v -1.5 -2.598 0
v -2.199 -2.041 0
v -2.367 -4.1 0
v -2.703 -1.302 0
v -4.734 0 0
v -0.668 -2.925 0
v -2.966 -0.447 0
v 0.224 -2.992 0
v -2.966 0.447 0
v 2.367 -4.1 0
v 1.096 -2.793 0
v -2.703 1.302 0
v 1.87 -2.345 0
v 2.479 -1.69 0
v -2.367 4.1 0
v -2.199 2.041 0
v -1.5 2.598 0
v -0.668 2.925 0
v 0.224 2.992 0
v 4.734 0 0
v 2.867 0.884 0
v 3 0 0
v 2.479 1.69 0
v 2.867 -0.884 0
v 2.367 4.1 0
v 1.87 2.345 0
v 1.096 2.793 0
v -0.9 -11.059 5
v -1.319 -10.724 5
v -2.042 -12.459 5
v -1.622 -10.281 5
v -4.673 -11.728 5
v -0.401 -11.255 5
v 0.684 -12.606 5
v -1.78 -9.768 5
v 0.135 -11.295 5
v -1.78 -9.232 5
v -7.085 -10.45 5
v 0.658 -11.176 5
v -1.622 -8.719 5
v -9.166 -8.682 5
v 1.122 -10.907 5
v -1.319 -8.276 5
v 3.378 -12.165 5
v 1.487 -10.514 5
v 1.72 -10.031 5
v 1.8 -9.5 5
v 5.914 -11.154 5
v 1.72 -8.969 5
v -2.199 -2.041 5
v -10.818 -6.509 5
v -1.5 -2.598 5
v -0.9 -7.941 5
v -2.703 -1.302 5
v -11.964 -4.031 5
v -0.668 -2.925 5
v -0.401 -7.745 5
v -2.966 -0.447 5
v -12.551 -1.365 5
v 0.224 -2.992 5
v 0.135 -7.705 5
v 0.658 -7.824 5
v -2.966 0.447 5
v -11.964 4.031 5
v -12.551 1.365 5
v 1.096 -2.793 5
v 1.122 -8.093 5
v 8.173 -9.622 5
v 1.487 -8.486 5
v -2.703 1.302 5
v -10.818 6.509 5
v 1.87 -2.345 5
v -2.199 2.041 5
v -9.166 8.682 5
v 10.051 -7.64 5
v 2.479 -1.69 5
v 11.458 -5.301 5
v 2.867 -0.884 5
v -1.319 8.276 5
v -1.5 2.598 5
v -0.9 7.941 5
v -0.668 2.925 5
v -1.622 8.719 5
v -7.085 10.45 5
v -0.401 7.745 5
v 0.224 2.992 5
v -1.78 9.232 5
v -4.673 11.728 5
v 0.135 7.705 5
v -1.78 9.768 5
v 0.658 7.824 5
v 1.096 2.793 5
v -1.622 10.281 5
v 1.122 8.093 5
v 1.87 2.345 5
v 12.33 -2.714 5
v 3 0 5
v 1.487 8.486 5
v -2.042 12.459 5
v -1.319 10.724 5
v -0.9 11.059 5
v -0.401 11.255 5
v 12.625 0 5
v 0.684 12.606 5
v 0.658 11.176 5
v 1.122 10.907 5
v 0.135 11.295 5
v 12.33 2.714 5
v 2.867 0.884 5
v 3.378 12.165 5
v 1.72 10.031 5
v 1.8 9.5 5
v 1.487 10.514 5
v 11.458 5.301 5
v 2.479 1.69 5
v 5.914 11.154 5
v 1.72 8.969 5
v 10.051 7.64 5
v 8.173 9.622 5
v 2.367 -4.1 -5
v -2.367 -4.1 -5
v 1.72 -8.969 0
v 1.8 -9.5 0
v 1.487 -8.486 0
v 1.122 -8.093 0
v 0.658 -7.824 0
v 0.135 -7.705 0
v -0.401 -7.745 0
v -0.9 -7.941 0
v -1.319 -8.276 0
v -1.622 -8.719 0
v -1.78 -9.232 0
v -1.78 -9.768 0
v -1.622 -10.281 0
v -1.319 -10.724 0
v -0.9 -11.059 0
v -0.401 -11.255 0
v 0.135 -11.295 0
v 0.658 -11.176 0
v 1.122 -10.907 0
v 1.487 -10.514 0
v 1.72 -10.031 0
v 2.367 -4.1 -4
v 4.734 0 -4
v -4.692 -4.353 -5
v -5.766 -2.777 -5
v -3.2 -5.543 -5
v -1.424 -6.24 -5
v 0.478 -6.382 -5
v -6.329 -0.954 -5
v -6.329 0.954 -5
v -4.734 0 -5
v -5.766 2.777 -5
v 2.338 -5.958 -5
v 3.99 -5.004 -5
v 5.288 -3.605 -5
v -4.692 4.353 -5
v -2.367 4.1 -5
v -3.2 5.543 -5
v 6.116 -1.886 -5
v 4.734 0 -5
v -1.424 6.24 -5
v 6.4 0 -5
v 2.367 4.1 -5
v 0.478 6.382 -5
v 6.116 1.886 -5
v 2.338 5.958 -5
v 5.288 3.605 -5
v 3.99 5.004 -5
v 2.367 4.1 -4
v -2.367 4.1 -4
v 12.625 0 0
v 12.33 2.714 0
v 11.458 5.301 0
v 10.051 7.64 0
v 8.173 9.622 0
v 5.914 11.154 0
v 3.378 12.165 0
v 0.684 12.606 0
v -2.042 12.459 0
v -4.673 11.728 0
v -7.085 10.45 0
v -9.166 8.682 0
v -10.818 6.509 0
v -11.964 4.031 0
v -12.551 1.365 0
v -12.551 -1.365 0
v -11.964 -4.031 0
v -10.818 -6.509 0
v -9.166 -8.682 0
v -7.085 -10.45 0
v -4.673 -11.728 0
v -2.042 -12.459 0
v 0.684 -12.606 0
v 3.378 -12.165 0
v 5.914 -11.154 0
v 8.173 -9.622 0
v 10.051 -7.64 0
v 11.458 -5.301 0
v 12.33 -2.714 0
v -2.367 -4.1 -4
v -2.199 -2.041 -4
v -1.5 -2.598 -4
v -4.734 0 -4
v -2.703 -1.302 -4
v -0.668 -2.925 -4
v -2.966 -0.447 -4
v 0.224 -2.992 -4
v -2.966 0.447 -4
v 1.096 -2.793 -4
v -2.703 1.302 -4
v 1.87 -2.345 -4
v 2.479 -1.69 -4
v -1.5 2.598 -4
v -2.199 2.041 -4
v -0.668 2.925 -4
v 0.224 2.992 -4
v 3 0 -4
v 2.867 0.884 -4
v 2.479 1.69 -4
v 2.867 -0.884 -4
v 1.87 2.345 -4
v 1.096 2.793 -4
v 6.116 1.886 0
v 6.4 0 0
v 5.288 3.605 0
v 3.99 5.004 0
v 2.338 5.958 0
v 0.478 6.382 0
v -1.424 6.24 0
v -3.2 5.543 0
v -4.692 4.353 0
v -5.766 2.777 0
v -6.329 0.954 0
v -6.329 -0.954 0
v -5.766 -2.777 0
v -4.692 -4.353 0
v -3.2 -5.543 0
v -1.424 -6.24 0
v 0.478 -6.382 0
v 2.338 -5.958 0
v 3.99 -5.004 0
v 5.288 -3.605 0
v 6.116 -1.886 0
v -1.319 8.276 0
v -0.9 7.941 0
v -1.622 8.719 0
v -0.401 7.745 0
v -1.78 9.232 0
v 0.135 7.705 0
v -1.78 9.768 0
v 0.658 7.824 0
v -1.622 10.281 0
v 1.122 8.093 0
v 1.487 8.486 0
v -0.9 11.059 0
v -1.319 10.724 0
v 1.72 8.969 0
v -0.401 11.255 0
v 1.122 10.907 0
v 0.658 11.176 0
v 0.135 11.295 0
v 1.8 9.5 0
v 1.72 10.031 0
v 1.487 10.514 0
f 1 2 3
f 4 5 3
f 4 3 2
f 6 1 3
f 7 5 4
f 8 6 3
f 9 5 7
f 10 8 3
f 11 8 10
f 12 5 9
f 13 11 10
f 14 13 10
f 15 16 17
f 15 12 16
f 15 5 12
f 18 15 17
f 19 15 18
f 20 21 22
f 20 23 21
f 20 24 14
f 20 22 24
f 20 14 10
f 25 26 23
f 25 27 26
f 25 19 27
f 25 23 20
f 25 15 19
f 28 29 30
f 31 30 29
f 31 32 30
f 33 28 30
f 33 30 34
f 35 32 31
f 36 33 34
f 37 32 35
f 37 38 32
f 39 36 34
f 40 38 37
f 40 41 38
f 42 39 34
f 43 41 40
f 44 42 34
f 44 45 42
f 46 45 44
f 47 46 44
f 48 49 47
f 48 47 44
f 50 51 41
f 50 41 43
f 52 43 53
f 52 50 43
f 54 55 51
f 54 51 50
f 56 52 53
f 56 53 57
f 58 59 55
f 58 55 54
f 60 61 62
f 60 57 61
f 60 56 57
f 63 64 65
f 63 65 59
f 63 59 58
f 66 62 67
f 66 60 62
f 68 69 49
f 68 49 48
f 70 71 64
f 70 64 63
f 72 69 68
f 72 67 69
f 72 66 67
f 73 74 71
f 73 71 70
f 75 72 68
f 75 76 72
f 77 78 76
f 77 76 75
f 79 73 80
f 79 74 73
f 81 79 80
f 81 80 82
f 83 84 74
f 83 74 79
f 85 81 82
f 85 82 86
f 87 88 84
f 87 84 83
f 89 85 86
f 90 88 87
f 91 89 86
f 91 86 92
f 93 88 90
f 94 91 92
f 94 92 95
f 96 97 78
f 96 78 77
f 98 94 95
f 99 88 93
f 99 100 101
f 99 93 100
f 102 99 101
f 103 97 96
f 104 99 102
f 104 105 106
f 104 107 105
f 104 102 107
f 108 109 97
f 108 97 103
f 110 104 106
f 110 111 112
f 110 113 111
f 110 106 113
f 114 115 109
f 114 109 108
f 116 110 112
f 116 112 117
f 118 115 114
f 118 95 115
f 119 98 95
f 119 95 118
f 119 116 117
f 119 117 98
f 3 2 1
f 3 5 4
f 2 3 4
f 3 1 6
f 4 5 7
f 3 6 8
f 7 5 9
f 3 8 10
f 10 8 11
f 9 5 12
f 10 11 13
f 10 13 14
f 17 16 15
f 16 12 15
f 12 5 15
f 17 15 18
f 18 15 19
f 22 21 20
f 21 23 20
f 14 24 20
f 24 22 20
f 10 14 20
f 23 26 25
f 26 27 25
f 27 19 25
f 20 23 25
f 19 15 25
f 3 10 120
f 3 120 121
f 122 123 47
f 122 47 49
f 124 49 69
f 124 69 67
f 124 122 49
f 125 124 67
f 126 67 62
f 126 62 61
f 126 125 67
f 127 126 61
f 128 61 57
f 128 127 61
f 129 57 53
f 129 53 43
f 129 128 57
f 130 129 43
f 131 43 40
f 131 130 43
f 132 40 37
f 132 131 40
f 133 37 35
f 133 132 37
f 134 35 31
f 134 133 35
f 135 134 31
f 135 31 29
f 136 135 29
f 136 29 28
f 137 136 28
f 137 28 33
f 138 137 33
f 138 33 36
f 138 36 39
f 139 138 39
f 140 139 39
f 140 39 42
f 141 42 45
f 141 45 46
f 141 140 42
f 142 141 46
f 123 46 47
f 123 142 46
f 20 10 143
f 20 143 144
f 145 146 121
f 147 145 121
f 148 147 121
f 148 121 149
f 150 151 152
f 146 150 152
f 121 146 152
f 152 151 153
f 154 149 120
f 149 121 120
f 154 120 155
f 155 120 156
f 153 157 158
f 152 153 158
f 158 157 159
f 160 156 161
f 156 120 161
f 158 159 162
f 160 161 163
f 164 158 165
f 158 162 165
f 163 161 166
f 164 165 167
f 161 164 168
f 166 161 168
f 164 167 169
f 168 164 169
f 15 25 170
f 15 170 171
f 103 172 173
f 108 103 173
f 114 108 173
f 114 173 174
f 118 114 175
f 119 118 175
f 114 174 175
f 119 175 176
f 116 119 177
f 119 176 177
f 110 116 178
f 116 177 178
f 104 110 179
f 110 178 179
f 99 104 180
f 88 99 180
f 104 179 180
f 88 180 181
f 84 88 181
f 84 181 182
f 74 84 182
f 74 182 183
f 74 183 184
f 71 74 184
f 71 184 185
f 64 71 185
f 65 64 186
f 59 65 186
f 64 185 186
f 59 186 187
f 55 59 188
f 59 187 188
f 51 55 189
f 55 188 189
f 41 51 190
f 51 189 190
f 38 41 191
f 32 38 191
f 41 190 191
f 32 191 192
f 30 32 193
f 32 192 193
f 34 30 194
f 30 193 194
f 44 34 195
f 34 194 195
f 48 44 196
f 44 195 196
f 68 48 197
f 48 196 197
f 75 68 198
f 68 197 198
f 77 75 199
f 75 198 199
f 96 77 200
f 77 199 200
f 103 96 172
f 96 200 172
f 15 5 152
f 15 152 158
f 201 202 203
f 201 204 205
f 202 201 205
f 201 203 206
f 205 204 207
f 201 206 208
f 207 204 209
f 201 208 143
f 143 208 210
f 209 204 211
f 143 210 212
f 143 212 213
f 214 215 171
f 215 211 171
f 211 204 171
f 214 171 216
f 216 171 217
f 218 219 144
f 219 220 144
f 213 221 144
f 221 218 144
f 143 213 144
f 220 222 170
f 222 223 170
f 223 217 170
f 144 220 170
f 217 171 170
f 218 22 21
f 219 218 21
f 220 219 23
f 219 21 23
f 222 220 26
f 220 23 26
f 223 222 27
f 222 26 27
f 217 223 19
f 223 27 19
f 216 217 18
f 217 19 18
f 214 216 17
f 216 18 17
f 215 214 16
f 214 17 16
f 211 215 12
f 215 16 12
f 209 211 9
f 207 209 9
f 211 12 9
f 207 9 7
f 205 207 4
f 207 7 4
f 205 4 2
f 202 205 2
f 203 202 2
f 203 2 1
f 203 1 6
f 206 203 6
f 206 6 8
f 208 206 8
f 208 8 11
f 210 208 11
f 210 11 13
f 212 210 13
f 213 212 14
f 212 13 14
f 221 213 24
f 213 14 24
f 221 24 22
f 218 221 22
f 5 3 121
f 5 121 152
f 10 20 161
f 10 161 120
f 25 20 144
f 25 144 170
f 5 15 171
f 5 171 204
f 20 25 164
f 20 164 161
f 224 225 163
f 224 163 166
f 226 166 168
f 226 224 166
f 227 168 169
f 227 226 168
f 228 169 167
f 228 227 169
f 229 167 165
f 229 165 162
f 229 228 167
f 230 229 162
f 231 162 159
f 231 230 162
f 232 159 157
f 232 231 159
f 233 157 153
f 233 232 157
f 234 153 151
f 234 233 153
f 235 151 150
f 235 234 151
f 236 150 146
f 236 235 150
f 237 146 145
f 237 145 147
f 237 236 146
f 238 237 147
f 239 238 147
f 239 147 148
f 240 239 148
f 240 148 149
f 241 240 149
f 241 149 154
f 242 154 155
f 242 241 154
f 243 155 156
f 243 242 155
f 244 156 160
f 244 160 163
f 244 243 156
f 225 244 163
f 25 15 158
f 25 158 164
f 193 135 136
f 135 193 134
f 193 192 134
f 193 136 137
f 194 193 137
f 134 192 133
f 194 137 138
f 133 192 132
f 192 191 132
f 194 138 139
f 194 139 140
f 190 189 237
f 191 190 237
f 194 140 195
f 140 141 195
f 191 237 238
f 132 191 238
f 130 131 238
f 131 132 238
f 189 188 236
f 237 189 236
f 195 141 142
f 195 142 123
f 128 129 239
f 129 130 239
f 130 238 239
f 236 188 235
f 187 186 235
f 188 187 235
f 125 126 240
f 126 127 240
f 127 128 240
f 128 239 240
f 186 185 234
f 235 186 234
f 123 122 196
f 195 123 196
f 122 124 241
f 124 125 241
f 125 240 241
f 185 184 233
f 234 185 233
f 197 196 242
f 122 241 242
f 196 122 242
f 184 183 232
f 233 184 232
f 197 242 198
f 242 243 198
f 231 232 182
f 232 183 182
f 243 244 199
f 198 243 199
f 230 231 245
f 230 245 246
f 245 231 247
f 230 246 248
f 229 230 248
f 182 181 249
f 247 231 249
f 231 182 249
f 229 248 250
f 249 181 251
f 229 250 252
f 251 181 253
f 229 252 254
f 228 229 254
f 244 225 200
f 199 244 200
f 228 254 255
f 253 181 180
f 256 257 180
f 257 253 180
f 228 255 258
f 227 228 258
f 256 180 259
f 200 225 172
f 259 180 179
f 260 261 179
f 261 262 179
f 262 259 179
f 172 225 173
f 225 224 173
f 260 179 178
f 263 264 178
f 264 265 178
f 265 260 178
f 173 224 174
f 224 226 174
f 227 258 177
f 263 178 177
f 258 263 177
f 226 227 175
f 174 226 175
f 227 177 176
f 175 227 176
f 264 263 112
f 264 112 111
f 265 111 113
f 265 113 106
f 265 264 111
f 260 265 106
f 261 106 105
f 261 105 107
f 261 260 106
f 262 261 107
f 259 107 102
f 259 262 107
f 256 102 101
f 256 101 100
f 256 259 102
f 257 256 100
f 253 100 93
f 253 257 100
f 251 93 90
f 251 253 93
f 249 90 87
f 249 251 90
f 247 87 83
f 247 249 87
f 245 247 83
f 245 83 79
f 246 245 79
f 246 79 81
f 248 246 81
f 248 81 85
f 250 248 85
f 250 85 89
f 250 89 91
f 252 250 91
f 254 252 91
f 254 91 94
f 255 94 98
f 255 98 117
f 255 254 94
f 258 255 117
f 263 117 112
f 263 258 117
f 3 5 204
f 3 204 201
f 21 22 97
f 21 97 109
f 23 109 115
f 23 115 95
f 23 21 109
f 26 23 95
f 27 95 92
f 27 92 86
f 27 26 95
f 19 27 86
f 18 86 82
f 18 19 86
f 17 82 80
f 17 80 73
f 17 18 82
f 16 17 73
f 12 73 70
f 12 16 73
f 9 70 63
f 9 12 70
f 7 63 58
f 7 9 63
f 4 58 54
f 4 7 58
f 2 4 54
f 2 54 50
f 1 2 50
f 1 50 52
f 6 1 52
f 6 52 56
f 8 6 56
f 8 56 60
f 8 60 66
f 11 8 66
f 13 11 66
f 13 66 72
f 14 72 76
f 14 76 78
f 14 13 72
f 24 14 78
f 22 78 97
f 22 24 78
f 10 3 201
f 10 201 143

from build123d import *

# Parameters (mm, degrees)
F0_R     = 12.625
F0_R_2   = 1.8
F0_R_3   = 6.4
F0_R_4   = 3
F1_DEPTH = 5
F2_DEPTH = 5
F3_DEPTH = 4


with BuildPart() as f1:
    # F0 (on Top) → F1 (new body)
    with BuildSketch(Plane.XY):
        Circle(F0_R)
        with Locations((0, -9.5)):
            Circle(F0_R_2, mode=Mode.SUBTRACT)
        Circle(F0_R_3, mode=Mode.SUBTRACT)
        with Locations((0, 9.5)):
            Circle(F0_R_2, mode=Mode.SUBTRACT)
        Circle(F0_R_3)
        Polygon((-4.734272, 0), (-2.367136, 4.1), (2.367136, 4.1), (4.734272, 0), (2.367136, -4.1), (-2.367136, -4.1), align=None, mode=Mode.SUBTRACT)
        Polygon((2.367136, 4.1), (-2.367136, 4.1), (-4.734272, 0), (-2.367136, -4.1), (2.367136, -4.1), (4.734272, 0), align=None)
        Circle(F0_R_4, mode=Mode.SUBTRACT)
    extrude(amount=F1_DEPTH)

    # F0 (on Top) → F2 (join)
    with BuildSketch(Plane.XY):
        Circle(F0_R_3)
        Polygon((-4.734272, 0), (-2.367136, 4.1), (2.367136, 4.1), (4.734272, 0), (2.367136, -4.1), (-2.367136, -4.1), align=None, mode=Mode.SUBTRACT)
    extrude(amount=-F2_DEPTH)


with BuildPart() as f3:
    # F0 (on Top) → F3 (new body)
    with BuildSketch(Plane.XY):
        Polygon((2.367136, 4.1), (-2.367136, 4.1), (-4.734272, 0), (-2.367136, -4.1), (2.367136, -4.1), (4.734272, 0), align=None)
        Circle(F0_R_4, mode=Mode.SUBTRACT)
    extrude(amount=-F3_DEPTH)


solid = Compound([f1.part, f3.part])
